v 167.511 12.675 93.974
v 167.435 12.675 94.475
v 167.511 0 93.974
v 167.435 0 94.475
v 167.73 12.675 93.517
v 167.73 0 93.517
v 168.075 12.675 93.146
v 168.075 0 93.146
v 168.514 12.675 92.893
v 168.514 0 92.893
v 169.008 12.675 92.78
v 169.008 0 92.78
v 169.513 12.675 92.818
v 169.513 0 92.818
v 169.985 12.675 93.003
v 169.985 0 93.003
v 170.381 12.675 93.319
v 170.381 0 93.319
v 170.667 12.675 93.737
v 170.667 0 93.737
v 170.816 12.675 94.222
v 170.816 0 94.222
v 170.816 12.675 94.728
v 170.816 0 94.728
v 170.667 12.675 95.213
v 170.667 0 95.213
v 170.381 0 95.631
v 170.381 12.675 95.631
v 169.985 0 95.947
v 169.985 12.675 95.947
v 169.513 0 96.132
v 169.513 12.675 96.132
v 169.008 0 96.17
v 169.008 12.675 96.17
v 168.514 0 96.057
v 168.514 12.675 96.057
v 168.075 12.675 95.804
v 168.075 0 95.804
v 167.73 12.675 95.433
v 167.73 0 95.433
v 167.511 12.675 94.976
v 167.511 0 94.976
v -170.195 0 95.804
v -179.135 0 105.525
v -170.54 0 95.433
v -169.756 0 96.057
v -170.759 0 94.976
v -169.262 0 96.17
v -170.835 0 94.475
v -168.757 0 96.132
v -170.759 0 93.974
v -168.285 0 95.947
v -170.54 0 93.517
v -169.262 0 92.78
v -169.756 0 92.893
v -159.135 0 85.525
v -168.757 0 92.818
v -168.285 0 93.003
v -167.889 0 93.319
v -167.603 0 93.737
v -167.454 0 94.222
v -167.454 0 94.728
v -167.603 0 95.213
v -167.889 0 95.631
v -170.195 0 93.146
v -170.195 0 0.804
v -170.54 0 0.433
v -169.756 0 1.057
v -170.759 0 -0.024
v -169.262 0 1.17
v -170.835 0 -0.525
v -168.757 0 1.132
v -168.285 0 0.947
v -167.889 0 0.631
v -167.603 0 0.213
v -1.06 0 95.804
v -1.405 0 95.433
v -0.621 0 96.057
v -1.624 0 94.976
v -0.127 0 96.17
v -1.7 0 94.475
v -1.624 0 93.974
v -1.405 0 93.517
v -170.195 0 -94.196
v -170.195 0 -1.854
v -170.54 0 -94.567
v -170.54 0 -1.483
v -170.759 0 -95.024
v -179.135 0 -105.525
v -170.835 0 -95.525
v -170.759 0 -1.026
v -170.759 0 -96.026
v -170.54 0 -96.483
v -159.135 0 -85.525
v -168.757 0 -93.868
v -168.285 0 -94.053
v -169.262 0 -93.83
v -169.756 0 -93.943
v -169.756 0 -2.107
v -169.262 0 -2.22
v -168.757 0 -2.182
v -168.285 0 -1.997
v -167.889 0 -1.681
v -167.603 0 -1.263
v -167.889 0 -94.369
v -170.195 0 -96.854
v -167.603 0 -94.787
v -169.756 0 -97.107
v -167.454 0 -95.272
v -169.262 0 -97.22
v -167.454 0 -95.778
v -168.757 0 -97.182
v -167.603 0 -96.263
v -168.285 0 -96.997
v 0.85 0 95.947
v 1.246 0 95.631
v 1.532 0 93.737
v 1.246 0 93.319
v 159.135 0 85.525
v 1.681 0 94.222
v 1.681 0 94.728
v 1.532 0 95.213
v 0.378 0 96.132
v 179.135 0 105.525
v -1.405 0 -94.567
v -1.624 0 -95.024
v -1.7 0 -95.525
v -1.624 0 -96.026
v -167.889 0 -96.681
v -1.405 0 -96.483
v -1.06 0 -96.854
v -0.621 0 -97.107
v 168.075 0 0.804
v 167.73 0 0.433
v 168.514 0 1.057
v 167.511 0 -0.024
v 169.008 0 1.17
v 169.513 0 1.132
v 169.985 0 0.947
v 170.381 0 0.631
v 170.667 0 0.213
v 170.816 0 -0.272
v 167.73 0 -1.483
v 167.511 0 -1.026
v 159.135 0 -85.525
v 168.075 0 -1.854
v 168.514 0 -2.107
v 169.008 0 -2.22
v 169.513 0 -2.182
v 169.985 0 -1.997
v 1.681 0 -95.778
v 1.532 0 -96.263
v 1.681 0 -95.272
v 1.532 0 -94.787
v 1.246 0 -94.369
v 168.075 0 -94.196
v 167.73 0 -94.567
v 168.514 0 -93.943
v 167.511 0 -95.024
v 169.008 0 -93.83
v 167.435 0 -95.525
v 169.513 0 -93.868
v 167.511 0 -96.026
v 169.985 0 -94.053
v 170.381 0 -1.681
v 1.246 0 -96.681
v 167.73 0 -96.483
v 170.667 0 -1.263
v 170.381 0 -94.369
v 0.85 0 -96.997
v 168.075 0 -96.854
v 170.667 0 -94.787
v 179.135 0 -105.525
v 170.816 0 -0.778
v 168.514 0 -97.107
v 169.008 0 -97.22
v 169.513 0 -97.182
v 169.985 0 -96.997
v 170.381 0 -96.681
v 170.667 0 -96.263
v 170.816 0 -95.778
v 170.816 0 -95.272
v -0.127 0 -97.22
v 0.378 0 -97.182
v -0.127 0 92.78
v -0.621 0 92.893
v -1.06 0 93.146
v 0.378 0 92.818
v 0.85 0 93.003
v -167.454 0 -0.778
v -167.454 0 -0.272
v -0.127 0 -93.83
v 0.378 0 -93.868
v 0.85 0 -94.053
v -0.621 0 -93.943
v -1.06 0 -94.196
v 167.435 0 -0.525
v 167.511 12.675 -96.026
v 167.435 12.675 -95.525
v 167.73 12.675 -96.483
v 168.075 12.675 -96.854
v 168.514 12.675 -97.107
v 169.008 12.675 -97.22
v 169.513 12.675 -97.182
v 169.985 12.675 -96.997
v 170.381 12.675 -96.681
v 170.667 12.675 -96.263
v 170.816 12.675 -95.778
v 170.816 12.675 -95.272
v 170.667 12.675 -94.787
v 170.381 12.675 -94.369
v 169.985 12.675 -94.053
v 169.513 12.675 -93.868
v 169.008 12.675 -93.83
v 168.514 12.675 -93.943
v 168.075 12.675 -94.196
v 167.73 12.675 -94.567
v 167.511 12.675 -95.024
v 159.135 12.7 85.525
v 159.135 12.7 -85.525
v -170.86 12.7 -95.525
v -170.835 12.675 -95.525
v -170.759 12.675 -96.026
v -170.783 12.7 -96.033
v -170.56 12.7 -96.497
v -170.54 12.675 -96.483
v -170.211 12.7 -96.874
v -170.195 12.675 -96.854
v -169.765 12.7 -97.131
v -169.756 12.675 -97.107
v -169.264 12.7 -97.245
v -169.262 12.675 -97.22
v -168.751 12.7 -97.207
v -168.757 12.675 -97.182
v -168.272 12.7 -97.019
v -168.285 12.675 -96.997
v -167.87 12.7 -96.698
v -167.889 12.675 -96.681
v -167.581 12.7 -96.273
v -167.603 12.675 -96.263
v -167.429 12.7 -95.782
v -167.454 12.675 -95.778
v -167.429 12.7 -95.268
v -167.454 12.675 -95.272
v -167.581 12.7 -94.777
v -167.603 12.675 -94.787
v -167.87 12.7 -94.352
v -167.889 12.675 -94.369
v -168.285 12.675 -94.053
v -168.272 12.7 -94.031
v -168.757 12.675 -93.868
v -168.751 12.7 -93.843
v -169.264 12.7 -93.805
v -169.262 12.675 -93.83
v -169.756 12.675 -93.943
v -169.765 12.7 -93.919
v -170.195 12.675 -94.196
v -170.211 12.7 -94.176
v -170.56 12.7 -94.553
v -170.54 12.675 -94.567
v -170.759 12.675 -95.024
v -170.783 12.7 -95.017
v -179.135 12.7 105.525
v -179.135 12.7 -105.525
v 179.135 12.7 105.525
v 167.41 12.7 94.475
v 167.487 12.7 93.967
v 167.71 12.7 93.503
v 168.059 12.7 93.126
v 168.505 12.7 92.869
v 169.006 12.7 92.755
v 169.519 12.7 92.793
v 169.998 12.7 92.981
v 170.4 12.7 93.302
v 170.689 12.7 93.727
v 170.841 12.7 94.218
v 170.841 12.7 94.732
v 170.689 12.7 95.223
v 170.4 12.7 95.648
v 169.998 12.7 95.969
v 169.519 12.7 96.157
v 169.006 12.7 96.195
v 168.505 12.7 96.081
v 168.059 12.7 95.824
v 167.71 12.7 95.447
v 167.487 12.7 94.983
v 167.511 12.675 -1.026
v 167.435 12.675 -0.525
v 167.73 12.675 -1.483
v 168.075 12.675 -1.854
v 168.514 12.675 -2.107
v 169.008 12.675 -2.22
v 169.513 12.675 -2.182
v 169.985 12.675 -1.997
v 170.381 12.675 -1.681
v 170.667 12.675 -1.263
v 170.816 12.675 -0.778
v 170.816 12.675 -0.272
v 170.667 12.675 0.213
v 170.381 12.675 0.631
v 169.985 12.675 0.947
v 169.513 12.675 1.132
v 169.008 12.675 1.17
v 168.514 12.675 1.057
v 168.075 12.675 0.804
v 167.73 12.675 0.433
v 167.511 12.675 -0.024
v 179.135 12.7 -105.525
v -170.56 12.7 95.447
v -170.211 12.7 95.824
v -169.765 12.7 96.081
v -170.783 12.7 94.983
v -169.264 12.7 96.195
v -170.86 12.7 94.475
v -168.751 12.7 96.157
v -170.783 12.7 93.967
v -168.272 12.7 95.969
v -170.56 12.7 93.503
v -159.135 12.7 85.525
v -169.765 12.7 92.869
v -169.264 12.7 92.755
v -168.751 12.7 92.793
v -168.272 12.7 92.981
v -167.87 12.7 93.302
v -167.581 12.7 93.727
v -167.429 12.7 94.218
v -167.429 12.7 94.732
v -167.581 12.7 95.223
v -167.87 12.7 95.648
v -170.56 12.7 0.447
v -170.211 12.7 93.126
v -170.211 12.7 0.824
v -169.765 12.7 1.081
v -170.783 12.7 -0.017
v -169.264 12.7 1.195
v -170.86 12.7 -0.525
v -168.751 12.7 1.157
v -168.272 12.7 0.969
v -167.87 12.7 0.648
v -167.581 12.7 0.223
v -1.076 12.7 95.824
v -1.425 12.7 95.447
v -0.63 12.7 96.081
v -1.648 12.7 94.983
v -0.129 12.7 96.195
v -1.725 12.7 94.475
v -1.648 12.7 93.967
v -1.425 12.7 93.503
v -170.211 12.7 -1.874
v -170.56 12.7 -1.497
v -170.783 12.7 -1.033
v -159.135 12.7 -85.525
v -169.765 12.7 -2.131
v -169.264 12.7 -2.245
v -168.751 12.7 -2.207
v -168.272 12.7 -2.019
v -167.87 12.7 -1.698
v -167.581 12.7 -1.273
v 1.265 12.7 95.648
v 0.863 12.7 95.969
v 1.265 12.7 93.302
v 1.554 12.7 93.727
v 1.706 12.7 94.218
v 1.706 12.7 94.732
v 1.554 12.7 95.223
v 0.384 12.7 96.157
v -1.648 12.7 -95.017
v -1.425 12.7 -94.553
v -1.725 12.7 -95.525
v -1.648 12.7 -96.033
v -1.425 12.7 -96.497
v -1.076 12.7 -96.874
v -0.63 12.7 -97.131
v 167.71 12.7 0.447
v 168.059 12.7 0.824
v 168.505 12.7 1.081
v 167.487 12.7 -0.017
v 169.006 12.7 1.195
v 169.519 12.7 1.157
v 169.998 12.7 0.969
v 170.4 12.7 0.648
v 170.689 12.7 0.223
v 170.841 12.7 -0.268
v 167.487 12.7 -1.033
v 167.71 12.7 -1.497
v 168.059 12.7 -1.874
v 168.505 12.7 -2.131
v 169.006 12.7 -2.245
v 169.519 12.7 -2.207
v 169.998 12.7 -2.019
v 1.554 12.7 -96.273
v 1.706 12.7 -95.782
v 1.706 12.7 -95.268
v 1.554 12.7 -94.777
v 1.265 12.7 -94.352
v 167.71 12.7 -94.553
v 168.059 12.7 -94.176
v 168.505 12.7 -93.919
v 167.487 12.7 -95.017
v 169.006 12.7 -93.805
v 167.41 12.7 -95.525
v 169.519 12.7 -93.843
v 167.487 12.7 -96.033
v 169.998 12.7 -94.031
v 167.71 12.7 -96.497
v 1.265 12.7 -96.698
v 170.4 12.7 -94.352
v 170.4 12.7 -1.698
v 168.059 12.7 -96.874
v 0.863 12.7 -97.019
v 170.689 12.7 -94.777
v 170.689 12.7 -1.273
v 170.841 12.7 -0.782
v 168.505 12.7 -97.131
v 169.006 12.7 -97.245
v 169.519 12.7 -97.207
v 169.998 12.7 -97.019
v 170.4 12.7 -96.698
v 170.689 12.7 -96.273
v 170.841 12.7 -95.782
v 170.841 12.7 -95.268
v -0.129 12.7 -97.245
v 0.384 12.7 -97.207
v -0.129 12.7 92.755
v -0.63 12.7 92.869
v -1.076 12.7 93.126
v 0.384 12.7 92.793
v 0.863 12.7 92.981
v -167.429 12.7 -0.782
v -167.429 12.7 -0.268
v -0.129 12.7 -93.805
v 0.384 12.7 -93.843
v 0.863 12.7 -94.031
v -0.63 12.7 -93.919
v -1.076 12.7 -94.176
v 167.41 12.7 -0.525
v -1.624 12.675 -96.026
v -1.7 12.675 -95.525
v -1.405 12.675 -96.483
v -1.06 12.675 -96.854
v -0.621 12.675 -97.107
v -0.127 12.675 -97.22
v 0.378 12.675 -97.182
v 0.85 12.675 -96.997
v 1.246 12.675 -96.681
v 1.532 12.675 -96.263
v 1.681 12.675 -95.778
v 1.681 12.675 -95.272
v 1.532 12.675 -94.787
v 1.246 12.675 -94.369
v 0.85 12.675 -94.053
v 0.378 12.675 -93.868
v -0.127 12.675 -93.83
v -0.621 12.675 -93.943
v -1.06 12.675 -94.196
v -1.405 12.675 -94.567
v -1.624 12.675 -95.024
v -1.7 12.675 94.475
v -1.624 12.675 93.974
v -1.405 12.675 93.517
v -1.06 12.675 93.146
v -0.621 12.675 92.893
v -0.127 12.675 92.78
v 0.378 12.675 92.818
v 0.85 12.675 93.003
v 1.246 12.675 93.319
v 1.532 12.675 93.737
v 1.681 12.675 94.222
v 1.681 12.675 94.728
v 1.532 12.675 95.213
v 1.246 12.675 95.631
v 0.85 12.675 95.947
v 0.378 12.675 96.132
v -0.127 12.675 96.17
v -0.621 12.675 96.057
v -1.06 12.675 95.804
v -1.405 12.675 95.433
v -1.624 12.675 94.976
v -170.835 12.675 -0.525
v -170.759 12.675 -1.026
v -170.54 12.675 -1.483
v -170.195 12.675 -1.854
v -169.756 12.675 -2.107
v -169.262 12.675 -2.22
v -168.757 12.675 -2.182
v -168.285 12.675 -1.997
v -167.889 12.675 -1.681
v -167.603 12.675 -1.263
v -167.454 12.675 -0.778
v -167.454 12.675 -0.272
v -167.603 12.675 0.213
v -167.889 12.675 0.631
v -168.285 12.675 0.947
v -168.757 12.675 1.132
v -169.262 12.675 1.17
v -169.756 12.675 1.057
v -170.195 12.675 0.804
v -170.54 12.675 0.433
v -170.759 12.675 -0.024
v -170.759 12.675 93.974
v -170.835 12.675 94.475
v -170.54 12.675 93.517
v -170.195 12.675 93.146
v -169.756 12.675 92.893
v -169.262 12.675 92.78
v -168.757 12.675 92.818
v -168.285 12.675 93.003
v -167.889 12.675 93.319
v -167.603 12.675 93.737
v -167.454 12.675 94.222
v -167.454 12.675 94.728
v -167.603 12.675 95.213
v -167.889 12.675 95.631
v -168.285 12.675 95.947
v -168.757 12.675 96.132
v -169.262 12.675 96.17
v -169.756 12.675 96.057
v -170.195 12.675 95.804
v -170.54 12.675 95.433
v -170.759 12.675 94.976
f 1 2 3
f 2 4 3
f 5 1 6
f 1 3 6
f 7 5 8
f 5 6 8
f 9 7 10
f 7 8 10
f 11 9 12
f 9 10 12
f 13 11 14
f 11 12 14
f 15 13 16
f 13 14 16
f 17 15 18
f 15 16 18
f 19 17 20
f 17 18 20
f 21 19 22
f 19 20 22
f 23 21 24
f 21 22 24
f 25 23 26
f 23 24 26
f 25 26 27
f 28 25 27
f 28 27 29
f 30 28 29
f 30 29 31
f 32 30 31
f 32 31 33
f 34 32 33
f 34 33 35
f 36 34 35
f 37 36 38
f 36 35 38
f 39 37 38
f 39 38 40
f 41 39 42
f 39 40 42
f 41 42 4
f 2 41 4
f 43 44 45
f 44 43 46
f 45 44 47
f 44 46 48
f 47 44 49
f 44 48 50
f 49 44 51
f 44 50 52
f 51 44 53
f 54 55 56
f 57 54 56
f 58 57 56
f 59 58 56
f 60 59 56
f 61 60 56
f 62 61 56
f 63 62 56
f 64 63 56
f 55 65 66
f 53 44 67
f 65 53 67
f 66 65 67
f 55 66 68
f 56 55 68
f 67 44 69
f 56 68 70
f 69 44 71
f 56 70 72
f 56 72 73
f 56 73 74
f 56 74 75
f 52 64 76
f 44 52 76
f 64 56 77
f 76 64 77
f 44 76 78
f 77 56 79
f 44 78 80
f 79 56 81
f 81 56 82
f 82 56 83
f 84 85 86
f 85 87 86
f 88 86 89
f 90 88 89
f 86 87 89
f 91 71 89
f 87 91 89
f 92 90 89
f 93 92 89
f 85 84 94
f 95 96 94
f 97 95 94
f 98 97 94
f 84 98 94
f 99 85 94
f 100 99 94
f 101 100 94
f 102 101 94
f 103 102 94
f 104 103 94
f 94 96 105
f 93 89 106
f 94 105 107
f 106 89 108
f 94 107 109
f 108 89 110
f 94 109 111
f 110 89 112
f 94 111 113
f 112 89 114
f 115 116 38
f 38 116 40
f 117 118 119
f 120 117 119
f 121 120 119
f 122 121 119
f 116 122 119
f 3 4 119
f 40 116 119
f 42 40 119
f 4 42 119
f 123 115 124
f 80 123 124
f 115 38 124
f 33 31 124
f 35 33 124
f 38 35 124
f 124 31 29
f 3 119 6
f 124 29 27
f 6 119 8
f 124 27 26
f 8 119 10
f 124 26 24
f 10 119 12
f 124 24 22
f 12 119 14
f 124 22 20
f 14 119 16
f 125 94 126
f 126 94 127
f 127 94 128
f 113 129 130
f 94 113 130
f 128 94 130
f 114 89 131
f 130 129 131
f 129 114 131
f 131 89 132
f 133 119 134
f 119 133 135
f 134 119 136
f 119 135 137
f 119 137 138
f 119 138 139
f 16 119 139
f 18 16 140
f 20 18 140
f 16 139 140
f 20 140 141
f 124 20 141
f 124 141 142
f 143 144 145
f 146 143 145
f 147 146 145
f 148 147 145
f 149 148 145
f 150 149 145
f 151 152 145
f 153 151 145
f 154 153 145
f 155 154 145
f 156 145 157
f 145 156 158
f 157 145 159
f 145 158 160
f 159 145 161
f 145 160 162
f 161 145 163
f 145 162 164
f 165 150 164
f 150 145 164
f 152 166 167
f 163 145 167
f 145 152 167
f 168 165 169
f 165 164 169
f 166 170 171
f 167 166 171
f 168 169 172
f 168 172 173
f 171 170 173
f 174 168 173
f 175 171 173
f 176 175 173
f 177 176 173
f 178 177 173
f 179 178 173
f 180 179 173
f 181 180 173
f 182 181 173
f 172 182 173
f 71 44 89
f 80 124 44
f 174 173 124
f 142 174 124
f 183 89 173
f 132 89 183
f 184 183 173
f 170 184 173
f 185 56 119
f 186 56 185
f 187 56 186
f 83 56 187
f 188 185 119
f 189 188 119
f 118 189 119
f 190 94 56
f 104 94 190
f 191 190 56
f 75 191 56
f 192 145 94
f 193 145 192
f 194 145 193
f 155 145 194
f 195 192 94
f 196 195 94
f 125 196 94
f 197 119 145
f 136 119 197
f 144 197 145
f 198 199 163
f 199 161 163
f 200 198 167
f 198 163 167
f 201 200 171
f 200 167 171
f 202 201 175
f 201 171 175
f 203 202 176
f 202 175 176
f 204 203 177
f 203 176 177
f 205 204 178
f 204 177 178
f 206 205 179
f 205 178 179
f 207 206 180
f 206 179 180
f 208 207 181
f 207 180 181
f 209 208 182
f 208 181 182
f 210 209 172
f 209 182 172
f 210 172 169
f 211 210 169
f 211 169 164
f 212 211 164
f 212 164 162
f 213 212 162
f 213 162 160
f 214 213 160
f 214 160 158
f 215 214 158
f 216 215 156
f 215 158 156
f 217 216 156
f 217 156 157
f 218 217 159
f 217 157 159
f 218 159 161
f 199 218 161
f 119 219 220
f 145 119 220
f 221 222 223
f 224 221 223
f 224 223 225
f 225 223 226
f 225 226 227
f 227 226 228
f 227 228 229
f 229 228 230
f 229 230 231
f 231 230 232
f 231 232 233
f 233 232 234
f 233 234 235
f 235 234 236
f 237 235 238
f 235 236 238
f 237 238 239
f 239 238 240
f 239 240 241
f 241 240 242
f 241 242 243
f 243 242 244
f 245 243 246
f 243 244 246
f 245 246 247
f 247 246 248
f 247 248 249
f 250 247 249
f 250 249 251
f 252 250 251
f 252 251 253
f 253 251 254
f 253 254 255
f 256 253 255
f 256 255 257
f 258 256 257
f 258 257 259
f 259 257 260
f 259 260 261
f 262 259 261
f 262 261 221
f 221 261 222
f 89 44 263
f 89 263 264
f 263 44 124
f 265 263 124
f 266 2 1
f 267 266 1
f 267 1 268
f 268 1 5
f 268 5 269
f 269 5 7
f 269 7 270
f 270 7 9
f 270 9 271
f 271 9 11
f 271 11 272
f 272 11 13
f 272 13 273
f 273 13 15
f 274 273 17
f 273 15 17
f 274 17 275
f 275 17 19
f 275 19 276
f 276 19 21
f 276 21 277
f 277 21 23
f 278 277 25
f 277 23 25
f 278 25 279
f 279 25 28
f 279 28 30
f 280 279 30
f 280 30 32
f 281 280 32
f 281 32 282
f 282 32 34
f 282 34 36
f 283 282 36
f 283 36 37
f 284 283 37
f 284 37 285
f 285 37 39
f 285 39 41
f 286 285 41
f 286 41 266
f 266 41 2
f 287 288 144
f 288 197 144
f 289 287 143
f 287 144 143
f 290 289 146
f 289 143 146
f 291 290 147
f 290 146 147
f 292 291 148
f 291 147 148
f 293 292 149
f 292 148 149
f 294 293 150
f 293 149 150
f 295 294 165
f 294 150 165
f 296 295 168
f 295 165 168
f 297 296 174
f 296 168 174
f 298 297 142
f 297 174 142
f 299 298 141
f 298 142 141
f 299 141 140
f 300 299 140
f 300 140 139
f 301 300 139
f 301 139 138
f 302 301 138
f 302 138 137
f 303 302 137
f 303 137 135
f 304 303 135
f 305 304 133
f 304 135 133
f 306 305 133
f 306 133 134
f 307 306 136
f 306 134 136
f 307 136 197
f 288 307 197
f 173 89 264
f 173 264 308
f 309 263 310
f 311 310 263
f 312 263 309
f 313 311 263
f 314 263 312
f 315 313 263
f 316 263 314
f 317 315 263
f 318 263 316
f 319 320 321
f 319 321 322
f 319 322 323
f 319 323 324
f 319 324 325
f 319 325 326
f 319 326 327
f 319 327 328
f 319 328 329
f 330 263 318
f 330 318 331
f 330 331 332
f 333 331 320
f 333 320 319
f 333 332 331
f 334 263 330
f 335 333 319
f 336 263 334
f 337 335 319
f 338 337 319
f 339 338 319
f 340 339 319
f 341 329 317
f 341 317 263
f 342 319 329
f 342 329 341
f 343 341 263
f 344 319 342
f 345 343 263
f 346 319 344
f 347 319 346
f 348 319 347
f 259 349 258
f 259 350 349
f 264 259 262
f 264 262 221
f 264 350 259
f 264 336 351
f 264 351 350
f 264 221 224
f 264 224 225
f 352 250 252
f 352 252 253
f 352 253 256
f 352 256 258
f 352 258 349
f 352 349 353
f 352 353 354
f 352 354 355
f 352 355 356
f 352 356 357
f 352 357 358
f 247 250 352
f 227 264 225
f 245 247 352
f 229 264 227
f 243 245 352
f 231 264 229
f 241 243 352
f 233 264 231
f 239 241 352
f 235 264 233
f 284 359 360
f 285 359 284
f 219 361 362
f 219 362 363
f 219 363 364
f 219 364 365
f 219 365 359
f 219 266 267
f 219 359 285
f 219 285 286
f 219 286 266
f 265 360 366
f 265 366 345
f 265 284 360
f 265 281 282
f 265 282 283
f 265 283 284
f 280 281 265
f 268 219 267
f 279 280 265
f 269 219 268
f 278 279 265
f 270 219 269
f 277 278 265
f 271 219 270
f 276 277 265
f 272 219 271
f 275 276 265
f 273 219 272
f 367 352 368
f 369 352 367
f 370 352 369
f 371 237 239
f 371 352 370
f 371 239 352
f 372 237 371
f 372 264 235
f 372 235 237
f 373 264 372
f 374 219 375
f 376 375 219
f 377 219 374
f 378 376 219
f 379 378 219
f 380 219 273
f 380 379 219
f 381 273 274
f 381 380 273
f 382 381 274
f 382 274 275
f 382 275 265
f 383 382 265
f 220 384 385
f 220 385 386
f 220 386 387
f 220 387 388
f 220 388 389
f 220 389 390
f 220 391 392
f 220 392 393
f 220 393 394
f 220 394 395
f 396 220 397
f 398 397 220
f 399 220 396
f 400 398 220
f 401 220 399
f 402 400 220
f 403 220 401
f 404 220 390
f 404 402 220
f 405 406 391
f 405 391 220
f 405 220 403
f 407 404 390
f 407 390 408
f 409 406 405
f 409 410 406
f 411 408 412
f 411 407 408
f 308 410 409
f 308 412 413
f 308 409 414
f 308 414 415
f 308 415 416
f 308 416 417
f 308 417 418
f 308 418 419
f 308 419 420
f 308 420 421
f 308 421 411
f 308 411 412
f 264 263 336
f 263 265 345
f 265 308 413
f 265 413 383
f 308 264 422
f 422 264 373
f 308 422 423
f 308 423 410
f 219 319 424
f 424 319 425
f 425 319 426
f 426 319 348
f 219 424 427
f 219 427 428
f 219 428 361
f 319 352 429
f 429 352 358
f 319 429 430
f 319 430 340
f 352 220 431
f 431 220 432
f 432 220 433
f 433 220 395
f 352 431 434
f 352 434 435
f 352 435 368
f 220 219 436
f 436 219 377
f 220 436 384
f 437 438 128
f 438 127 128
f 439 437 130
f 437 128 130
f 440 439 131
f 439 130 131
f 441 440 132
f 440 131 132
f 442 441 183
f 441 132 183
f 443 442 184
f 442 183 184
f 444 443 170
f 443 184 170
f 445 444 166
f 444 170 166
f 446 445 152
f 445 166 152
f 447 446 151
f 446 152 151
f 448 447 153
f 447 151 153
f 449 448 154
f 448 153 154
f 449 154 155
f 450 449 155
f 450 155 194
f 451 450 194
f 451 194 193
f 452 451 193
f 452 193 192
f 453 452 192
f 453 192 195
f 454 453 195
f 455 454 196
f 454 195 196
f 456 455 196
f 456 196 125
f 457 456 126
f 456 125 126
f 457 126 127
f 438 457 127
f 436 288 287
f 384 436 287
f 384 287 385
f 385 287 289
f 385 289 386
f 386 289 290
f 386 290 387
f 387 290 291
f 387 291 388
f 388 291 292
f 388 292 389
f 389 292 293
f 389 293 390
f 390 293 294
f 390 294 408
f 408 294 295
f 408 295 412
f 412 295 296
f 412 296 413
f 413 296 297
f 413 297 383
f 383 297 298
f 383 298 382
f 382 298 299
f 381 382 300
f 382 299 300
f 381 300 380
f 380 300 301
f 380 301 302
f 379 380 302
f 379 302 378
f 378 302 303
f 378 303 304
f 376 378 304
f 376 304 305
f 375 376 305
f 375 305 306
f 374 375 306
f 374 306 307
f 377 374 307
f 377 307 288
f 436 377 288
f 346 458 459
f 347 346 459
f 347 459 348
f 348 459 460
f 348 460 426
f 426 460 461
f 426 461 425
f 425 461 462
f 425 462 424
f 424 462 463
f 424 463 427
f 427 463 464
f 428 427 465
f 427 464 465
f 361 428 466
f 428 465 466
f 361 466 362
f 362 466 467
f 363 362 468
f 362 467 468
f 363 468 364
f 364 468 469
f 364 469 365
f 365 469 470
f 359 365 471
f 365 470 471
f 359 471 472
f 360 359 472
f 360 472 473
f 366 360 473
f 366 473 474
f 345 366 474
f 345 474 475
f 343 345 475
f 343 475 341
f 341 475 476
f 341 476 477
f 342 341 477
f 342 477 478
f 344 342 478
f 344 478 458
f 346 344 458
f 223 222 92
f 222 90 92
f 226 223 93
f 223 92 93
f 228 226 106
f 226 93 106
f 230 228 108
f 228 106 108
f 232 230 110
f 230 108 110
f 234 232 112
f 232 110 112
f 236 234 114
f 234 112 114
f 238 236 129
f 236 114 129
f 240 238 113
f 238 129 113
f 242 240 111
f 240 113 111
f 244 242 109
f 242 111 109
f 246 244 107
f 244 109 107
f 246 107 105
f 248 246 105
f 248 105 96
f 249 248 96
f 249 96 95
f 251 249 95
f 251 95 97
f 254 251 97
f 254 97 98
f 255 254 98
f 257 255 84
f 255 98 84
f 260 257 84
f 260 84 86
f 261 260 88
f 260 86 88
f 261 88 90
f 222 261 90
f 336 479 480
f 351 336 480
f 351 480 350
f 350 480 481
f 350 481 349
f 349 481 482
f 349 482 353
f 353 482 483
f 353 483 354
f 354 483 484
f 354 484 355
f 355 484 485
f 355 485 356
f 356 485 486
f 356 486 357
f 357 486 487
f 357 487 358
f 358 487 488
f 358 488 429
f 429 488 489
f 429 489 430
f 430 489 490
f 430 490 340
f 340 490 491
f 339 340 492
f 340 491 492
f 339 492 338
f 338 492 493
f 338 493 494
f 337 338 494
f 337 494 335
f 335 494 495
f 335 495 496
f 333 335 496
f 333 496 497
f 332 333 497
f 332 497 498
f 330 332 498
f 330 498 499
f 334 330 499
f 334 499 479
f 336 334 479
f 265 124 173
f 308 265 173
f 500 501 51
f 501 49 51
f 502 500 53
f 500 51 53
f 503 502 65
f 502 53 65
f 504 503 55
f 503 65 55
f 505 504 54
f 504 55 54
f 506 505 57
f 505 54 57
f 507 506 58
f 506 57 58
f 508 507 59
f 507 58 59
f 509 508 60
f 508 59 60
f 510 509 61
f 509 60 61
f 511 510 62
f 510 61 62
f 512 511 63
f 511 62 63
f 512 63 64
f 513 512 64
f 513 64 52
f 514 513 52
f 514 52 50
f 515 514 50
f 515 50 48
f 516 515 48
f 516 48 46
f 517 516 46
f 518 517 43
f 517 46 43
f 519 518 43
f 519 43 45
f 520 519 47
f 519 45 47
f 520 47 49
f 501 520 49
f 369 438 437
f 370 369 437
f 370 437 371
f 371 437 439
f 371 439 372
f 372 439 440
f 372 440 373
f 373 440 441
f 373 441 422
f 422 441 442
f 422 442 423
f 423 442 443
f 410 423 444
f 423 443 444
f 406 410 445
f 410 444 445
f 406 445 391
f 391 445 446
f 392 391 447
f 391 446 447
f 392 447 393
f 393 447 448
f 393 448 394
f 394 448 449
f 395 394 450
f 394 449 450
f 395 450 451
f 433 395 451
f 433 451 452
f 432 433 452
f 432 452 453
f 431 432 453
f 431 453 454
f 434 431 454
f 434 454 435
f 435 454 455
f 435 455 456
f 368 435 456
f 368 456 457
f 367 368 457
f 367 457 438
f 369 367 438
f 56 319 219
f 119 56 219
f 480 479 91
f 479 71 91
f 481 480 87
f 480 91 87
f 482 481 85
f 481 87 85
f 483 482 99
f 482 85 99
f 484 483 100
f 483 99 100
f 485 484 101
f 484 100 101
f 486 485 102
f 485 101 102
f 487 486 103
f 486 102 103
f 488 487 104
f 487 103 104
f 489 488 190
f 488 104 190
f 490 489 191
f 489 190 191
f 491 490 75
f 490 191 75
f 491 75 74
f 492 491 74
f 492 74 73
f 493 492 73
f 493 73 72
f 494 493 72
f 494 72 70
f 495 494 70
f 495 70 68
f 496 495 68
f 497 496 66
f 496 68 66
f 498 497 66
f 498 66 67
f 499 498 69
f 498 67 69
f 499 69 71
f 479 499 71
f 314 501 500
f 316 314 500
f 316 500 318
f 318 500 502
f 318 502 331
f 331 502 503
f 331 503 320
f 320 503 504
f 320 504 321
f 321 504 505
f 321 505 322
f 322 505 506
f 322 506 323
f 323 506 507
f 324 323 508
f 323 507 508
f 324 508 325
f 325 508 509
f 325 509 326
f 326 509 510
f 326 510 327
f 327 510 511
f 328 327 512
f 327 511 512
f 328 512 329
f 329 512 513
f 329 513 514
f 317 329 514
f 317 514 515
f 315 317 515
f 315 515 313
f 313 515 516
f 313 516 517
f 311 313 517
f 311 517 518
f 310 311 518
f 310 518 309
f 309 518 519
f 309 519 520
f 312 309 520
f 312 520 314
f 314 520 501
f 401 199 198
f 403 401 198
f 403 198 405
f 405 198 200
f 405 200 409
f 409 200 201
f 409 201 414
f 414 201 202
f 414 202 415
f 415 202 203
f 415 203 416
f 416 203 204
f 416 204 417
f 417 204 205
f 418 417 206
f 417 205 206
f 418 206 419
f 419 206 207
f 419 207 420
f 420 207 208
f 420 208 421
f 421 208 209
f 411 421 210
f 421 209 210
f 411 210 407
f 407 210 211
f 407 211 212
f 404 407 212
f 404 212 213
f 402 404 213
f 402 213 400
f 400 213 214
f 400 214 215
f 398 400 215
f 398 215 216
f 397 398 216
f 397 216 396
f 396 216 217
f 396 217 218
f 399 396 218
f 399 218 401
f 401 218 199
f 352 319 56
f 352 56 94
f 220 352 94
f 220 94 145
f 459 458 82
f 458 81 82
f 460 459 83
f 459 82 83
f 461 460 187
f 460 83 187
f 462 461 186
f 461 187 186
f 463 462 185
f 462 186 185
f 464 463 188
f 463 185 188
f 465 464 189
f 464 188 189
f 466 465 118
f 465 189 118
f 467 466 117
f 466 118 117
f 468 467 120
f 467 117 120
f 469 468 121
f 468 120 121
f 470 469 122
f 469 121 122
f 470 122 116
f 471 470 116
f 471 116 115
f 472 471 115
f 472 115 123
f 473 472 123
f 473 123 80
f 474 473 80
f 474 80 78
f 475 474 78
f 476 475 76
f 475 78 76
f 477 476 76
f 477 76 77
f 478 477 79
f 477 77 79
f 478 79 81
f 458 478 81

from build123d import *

# Parameters (mm, degrees)
SKETCH1_W                      = 358.27
SKETCH1_H                      = 211.05
BOSS_EXTRUDE1_DEPTH            = 12.7
SKETCH2_W                      = 318.27
SKETCH2_H                      = 171.05
CUT_EXTRUDE1_DEPTH             = 12.7
M3_CLEARANCE_HOLE1_D           = 3.4
M3_CLEARANCE_HOLE1_CSINK_D     = 3.45
M3_CLEARANCE_HOLE1_CSINK_ANGLE = 90


with BuildPart() as part:
    # Sketch1 → Boss-Extrude1 (new body)
    with BuildSketch(Plane(origin=(0, 0, 0), x_dir=(1, 0, 0), z_dir=(0, 1, 0))):
        Rectangle(SKETCH1_W, SKETCH1_H)
    extrude(amount=BOSS_EXTRUDE1_DEPTH)

    # Sketch2 → Cut-Extrude1 (cut)
    with BuildSketch(Plane(origin=(0, 12.7, 0), x_dir=(1, 0, 0), z_dir=(0, 1, 0))):
        Rectangle(SKETCH2_W, SKETCH2_H)
    extrude(amount=-CUT_EXTRUDE1_DEPTH, mode=Mode.SUBTRACT)

    # M3 Clearance Hole1 (through all)
    with Locations(Plane(origin=(0, 12.7, 0), x_dir=(1, 0, 0), z_dir=(0, 1, 0))):
        with Locations((-169.135, 95.525), (-169.135, 0.525), (-169.135, -94.475), (0, -94.475), (169.135, -94.475), (169.135, 0.525), (169.135, 95.525), (0, 95.525)):
            CounterSinkHole(M3_CLEARANCE_HOLE1_D / 2, M3_CLEARANCE_HOLE1_CSINK_D / 2, counter_sink_angle=M3_CLEARANCE_HOLE1_CSINK_ANGLE)


solid = part.part
